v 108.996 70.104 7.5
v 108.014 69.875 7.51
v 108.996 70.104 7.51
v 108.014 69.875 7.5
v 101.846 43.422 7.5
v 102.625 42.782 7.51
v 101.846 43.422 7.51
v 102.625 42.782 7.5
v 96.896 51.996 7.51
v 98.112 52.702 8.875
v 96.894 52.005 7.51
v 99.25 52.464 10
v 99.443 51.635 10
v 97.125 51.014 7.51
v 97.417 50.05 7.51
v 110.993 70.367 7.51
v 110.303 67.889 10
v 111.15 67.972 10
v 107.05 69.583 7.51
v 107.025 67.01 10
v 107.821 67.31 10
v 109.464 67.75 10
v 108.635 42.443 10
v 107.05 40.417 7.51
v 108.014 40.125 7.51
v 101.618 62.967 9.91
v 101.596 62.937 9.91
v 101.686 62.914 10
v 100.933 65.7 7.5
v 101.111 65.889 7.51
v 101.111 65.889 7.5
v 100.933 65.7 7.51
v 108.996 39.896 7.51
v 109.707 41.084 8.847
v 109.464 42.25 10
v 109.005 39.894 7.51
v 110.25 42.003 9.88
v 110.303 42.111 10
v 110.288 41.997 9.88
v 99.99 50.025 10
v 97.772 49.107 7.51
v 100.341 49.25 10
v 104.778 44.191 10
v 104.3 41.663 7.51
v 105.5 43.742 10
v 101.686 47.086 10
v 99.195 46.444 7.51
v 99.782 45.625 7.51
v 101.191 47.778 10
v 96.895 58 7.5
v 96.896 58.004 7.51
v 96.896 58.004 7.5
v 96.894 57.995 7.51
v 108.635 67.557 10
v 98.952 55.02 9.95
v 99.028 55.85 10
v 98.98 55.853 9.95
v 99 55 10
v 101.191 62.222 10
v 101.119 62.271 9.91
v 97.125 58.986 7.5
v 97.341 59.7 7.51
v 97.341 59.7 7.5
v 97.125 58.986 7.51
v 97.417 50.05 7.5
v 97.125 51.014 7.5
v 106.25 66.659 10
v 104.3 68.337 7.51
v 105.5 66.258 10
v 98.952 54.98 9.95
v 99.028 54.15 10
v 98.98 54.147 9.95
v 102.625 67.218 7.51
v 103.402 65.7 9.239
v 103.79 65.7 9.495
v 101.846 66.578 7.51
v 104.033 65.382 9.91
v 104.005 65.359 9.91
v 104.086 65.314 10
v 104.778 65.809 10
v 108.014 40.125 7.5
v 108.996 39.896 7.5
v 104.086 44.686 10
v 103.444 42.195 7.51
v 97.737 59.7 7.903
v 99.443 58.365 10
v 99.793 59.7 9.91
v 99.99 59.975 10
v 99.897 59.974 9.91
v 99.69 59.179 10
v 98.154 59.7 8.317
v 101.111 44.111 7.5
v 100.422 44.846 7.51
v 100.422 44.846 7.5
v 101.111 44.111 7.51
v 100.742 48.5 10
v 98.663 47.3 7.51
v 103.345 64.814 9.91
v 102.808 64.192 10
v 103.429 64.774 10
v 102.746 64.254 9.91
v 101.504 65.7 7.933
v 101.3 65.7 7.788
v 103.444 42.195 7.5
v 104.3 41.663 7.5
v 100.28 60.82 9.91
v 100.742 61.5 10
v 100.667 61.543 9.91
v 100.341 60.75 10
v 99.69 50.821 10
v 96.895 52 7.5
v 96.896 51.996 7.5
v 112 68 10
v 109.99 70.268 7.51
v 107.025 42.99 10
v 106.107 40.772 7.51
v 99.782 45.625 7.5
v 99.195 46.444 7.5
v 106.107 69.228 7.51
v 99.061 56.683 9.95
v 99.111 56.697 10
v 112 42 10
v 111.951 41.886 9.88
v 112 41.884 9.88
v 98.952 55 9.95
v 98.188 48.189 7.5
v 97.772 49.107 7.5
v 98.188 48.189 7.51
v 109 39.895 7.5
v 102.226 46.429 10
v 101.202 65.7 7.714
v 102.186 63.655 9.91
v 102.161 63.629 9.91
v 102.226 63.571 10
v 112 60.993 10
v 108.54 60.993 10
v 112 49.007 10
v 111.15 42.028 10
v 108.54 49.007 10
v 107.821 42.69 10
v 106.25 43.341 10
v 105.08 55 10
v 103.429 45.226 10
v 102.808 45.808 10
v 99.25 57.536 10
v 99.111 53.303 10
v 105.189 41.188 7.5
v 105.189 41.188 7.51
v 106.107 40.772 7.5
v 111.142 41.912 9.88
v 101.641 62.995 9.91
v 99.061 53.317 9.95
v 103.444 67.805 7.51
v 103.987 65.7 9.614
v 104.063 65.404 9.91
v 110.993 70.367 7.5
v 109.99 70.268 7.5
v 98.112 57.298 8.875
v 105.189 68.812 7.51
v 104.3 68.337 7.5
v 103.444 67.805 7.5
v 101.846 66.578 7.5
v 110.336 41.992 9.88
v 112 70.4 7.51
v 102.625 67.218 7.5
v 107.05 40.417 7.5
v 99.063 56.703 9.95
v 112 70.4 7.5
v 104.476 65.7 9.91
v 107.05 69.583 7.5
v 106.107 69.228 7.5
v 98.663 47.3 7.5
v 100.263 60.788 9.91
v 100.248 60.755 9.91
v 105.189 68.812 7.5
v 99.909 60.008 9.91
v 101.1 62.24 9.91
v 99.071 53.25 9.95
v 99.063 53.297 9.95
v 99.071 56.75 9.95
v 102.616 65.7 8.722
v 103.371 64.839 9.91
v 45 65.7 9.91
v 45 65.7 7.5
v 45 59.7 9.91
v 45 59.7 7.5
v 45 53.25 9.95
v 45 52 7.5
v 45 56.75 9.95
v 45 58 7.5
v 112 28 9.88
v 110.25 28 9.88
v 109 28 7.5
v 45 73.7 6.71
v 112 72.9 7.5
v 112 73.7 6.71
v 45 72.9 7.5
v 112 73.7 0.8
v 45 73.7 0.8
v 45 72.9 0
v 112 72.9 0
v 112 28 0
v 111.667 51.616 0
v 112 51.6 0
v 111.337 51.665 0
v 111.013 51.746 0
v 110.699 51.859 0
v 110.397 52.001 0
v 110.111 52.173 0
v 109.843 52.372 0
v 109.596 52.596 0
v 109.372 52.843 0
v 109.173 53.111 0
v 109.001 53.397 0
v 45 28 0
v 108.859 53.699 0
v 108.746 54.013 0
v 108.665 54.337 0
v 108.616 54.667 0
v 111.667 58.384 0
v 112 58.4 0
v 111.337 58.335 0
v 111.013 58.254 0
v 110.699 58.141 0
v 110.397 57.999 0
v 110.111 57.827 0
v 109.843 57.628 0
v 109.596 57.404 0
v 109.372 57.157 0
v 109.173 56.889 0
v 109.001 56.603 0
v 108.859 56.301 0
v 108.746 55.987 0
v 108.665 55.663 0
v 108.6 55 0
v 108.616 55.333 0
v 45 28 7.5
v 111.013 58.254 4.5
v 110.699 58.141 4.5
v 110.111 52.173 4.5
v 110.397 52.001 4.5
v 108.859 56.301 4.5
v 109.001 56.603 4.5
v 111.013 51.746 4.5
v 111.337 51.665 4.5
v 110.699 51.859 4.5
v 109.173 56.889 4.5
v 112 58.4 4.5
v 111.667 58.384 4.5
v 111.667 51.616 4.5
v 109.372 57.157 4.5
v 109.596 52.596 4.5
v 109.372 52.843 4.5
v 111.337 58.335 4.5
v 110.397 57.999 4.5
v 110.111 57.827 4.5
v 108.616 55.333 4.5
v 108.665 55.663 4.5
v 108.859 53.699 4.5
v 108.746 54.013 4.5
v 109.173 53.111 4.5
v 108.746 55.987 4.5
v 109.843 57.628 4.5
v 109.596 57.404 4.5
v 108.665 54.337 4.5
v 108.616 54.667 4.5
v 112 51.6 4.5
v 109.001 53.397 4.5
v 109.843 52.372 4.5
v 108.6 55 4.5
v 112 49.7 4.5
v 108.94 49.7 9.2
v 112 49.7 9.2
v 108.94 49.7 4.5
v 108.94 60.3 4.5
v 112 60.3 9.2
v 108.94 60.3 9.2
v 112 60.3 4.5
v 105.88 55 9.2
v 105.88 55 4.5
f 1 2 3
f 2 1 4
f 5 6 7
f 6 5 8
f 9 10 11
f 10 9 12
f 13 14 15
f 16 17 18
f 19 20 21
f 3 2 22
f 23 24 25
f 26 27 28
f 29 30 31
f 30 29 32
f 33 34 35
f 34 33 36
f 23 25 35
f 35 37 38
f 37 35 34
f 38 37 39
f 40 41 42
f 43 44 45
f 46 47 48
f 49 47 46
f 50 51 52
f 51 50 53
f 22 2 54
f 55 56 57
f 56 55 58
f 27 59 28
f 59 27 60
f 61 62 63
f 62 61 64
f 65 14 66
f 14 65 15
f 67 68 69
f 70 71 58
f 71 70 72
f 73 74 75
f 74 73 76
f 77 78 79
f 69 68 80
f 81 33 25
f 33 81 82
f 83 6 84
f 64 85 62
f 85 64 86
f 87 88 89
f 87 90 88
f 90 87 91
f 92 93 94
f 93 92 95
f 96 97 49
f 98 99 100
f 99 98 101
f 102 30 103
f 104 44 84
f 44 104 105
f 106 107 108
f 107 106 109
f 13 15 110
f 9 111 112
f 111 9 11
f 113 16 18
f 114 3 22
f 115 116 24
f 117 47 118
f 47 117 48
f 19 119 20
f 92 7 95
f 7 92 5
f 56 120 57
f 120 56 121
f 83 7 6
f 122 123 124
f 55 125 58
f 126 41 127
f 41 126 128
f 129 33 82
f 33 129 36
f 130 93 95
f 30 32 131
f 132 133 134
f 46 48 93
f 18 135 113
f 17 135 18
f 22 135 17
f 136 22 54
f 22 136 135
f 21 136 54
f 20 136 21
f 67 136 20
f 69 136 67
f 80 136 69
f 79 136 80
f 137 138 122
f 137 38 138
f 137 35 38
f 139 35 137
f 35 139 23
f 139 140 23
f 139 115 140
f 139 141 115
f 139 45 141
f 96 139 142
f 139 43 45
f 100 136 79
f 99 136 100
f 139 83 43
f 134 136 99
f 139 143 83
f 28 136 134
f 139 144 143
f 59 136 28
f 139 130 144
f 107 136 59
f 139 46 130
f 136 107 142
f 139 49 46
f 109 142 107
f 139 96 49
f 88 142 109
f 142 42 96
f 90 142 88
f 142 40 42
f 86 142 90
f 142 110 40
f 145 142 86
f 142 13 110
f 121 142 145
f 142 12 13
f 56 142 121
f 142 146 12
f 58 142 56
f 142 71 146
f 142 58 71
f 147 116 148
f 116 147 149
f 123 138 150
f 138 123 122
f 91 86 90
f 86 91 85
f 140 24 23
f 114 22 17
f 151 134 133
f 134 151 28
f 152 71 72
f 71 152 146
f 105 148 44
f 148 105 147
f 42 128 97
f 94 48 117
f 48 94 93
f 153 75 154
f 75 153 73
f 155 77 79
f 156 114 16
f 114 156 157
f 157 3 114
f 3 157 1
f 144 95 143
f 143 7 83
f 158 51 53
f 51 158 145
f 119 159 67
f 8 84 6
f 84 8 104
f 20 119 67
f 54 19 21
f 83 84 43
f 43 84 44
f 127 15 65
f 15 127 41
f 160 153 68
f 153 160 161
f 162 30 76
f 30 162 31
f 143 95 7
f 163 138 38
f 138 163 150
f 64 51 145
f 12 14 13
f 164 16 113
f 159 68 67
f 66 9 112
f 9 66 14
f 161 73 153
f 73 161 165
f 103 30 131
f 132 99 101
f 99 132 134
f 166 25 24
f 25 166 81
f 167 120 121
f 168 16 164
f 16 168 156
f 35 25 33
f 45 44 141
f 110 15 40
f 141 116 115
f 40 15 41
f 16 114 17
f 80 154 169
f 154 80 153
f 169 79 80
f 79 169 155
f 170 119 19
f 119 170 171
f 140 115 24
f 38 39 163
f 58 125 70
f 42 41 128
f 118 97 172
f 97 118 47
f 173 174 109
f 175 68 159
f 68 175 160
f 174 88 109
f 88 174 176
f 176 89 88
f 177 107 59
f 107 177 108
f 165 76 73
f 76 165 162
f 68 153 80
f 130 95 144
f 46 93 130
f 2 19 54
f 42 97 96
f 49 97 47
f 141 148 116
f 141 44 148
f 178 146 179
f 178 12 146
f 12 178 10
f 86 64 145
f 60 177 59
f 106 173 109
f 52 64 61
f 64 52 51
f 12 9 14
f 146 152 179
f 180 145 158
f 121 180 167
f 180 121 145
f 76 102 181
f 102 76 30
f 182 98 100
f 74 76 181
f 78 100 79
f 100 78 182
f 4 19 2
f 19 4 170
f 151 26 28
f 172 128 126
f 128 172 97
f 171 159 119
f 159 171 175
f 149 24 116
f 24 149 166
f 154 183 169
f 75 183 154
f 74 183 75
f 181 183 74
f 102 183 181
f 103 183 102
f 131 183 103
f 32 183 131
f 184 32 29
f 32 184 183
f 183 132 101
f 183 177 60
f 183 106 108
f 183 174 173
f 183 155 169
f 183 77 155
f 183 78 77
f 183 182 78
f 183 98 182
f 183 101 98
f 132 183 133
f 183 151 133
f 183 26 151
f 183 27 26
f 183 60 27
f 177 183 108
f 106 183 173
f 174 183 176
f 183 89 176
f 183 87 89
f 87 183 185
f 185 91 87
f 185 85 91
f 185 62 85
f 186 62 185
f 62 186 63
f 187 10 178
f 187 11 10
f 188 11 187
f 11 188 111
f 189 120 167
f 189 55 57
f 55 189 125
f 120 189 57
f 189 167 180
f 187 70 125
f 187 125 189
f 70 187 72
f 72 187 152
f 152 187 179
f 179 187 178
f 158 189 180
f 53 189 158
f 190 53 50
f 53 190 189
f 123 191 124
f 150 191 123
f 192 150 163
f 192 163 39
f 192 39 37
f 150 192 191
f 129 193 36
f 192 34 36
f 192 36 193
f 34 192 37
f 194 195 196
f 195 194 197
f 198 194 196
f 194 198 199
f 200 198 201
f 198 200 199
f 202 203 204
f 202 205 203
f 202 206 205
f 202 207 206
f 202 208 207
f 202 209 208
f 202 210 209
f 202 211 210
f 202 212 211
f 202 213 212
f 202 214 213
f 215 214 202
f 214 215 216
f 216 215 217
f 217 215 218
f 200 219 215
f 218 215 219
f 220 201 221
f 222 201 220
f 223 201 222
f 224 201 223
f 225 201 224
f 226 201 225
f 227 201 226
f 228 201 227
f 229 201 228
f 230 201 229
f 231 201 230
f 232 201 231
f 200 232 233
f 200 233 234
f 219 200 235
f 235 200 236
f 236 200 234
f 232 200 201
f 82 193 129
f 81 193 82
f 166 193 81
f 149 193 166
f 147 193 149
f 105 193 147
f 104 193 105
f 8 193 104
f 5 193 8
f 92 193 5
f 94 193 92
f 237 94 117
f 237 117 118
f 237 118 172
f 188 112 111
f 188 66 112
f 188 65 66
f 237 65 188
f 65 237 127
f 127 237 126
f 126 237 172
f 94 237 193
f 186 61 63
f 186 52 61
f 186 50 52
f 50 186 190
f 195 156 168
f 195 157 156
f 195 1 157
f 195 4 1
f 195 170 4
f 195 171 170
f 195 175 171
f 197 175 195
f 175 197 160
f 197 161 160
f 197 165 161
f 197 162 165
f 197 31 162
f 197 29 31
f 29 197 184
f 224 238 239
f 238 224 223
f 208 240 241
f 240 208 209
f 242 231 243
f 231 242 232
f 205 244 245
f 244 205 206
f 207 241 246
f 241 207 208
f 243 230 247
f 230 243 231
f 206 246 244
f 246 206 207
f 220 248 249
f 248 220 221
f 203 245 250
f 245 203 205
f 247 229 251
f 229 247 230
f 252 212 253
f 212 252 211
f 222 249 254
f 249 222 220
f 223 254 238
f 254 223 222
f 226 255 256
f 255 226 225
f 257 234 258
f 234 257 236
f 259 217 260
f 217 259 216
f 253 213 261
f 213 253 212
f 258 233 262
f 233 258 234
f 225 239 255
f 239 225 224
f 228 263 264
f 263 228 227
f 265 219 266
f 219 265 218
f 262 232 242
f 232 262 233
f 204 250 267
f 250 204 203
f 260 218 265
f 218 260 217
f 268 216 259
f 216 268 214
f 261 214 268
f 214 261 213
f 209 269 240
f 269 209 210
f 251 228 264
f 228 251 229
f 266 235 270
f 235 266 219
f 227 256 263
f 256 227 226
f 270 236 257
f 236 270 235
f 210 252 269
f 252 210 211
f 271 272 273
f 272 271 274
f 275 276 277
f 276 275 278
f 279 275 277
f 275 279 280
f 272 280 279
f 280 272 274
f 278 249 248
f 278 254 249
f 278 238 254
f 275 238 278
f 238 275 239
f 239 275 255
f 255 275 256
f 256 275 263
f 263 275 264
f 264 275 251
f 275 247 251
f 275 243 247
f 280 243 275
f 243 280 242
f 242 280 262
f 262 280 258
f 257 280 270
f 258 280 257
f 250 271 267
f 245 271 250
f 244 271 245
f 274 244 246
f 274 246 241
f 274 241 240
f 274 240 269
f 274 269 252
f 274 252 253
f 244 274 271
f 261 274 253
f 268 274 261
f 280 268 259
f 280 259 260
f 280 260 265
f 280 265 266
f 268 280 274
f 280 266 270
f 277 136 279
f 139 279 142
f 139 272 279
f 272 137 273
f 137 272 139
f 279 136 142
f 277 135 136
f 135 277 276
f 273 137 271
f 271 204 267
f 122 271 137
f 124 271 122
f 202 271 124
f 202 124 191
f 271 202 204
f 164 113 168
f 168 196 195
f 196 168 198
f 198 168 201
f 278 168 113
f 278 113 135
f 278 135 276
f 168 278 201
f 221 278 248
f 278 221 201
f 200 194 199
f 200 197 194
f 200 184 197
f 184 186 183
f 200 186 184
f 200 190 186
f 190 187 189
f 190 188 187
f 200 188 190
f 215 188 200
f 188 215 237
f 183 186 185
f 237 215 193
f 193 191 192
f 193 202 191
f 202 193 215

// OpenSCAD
// file: seat_board_lib.scad
// =====================================================================
//  RAD passenger seat - shared board geometry (no top-level object)
//  Included by seat_board.scad (one piece) and seat_board_split.scad
//  (two interlocking halves).
//  All dimensions in millimetres.
// =====================================================================

/* [Seat footprint] */
seat_len      = 11.5 * 25.4;   // 292.1  cushion overall length
seat_wid      = 6.0  * 25.4;   // 152.4  cushion overall width
side_clear    = 2.5;           // margin per side inside the cover (5 mm total)
corner_r      = 18;            // plan-view corner radius
edge_chamfer  = 0.8;           // chamfer on top and bottom perimeters

/* [Bolt pattern - centred] */
pitch_x       = 224;           // eye-to-eye, along length
pitch_y       = 110;           // eye-to-eye, across width
bolt_hole_d   = 6.8;           // M6 clearance
hex_af        = 10.0;          // M6 hex head across flats
hex_fit       = 0.6;           // total clearance in hex trap (print tolerance)
hex_depth     = 5.5;           // trap depth from the top of the boss
hex_lead      = 0.8;           // lead-in chamfer at trap mouth
hex_rot       = 0;             // 0 deg = flats parallel to X axis

/* [Height budget] */
// total_height is the only dimension the cover cares about. Everything
// above the plate (ribs, rim, bolt pads) is packed into the leftover.
total_height  = 10.0;
thickness     = 7.5;           // plate; the remainder becomes rib depth

/* [Reinforcement] */
reinforce     = true;          // bosses + rib grid on the cushion face
boss_d        = 26;            // pad diameter at each bolt
boss_fillet   = 2.5;           // 45 deg blend into the plate
rib_w         = 6.0;           // rib width at the base
rib_top_w     = 3.5;           // rib width at the top
rim           = true;          // closed perimeter rib = torsion box
rim_inset     = 8.0;           // board edge to rim outer face
rim_w         = 6.0;           // rim width
rib_inset     = 6.0;           // rib end clearance when the rim is off

rib_h         = total_height - thickness;
boss_h        = rib_h;
rib_reach     = rim ? rim_inset + rim_w / 2 : rib_inset;

// ---------------------------------------------------------------------
board_len = seat_len - 2 * side_clear;
board_wid = seat_wid - 2 * side_clear;
hex_d     = (hex_af + hex_fit) / cos(30);   // across-corners of trap
hex_top   = thickness + (reinforce ? boss_h : 0);

$fn = 64;

// ---------------------------------------------------------------------
module rrect(l, w, r) {
    offset(r = r, $fn = 128) square([l - 2 * r, w - 2 * r], center = true);
}

// plate with chamfered top and bottom perimeter
module slab(l, w, r, h, c) {
    hull() {
        linear_extrude(0.01)          offset(delta = -c) rrect(l, w, r);
        translate([0, 0, c])          linear_extrude(0.01) rrect(l, w, r);
        translate([0, 0, h - c])      linear_extrude(0.01) rrect(l, w, r);
        translate([0, 0, h - 0.01])   linear_extrude(0.01) offset(delta = -c) rrect(l, w, r);
    }
}

// conical-skirted pad around a bolt station
module boss() {
    // keep the fillet control below the boss top so the hull cannot overshoot
    // the height envelope when boss_h equals boss_fillet
    fillet = min(boss_fillet, boss_h - 0.1);
    hull() {
        translate([0, 0, thickness - 0.01])
            cylinder(d = boss_d + 2 * fillet, h = 0.02, $fn = 96);
        translate([0, 0, thickness + fillet])
            cylinder(d = boss_d, h = 0.01, $fn = 96);
        translate([0, 0, hex_top - 0.01])
            cylinder(d = boss_d, h = 0.01, $fn = 96);
    }
}

// one tapered rib, length along local X, centred on local origin.
// ztop is nudged per rib family so no two top faces end up coplanar.
module rib(len, ztop) {
    hull() {
        translate([0, 0, thickness - 0.01])
            cube([len, rib_w, 0.02], center = true);
        translate([0, 0, ztop - 0.01])
            cube([len, rib_top_w, 0.02], center = true);
    }
}

// closed loop around the perimeter - ties every rib into a torsion box
module rim_ring() {
    z0 = thickness - 0.01;
    z1 = hex_top - 0.09;
    translate([0, 0, z0])
        difference() {
            linear_extrude(z1 - z0)
                rrect(board_len - 2 * rim_inset, board_wid - 2 * rim_inset,
                      max(0.5, corner_r - rim_inset));
            translate([0, 0, -1])
                linear_extrude(z1 - z0 + 2)
                    rrect(board_len - 2 * rim_inset - 2 * rim_w,
                          board_wid - 2 * rim_inset - 2 * rim_w,
                          max(0.5, corner_r - rim_inset - rim_w));
        }
}

module bolt_station() {
    translate([0, 0, -1])
        cylinder(d = bolt_hole_d, h = hex_top + 3, $fn = 64);

    translate([0, 0, hex_top - hex_depth])
        cylinder(d = hex_d, h = hex_depth + 1, $fn = 6);

    translate([0, 0, hex_top - hex_lead])
        hull() {
            cylinder(d = hex_d, h = 0.01, $fn = 6);
            translate([0, 0, hex_lead])
                cylinder(d = hex_d + 2 * hex_lead, h = 0.01, $fn = 6);
        }
}

// cross_ribs is exposed so the split version can move the centre ribs
// clear of the interlocking seam.
module seat_board(cross_ribs = [-pitch_x / 2, 0, pitch_x / 2]) {
    difference() {
        union() {
            slab(board_len, board_wid, corner_r, thickness, edge_chamfer);

            if (reinforce) {
                for (sx = [-1, 1], sy = [-1, 1])
                    translate([sx * pitch_x / 2, sy * pitch_y / 2, 0])
                        boss();

                if (rim)
                    rim_ring();

                for (y = [-pitch_y / 2, 0, pitch_y / 2])
                    translate([0, y, 0])
                        rib(board_len - 2 * rib_reach, hex_top - 0.05);

                for (x = cross_ribs)
                    translate([x, 0, 0])
                        rotate([0, 0, 90])
                            rib(board_wid - 2 * rib_reach, hex_top - 0.12);
            }
        }

        for (sx = [-1, 1], sy = [-1, 1])
            translate([sx * pitch_x / 2, sy * pitch_y / 2, 0])
                rotate([0, 0, hex_rot])
                    bolt_station();
    }
}
// main file
// Axial section through the bolt station at x = +112.
use <seat_board_lib.scad>

intersection() {
    difference() {
        seat_board();
        translate([112, -400, -50]) cube([800, 800, 200]);
    }
    translate([45, 28, -5]) cube([200, 54, 40]);
}
